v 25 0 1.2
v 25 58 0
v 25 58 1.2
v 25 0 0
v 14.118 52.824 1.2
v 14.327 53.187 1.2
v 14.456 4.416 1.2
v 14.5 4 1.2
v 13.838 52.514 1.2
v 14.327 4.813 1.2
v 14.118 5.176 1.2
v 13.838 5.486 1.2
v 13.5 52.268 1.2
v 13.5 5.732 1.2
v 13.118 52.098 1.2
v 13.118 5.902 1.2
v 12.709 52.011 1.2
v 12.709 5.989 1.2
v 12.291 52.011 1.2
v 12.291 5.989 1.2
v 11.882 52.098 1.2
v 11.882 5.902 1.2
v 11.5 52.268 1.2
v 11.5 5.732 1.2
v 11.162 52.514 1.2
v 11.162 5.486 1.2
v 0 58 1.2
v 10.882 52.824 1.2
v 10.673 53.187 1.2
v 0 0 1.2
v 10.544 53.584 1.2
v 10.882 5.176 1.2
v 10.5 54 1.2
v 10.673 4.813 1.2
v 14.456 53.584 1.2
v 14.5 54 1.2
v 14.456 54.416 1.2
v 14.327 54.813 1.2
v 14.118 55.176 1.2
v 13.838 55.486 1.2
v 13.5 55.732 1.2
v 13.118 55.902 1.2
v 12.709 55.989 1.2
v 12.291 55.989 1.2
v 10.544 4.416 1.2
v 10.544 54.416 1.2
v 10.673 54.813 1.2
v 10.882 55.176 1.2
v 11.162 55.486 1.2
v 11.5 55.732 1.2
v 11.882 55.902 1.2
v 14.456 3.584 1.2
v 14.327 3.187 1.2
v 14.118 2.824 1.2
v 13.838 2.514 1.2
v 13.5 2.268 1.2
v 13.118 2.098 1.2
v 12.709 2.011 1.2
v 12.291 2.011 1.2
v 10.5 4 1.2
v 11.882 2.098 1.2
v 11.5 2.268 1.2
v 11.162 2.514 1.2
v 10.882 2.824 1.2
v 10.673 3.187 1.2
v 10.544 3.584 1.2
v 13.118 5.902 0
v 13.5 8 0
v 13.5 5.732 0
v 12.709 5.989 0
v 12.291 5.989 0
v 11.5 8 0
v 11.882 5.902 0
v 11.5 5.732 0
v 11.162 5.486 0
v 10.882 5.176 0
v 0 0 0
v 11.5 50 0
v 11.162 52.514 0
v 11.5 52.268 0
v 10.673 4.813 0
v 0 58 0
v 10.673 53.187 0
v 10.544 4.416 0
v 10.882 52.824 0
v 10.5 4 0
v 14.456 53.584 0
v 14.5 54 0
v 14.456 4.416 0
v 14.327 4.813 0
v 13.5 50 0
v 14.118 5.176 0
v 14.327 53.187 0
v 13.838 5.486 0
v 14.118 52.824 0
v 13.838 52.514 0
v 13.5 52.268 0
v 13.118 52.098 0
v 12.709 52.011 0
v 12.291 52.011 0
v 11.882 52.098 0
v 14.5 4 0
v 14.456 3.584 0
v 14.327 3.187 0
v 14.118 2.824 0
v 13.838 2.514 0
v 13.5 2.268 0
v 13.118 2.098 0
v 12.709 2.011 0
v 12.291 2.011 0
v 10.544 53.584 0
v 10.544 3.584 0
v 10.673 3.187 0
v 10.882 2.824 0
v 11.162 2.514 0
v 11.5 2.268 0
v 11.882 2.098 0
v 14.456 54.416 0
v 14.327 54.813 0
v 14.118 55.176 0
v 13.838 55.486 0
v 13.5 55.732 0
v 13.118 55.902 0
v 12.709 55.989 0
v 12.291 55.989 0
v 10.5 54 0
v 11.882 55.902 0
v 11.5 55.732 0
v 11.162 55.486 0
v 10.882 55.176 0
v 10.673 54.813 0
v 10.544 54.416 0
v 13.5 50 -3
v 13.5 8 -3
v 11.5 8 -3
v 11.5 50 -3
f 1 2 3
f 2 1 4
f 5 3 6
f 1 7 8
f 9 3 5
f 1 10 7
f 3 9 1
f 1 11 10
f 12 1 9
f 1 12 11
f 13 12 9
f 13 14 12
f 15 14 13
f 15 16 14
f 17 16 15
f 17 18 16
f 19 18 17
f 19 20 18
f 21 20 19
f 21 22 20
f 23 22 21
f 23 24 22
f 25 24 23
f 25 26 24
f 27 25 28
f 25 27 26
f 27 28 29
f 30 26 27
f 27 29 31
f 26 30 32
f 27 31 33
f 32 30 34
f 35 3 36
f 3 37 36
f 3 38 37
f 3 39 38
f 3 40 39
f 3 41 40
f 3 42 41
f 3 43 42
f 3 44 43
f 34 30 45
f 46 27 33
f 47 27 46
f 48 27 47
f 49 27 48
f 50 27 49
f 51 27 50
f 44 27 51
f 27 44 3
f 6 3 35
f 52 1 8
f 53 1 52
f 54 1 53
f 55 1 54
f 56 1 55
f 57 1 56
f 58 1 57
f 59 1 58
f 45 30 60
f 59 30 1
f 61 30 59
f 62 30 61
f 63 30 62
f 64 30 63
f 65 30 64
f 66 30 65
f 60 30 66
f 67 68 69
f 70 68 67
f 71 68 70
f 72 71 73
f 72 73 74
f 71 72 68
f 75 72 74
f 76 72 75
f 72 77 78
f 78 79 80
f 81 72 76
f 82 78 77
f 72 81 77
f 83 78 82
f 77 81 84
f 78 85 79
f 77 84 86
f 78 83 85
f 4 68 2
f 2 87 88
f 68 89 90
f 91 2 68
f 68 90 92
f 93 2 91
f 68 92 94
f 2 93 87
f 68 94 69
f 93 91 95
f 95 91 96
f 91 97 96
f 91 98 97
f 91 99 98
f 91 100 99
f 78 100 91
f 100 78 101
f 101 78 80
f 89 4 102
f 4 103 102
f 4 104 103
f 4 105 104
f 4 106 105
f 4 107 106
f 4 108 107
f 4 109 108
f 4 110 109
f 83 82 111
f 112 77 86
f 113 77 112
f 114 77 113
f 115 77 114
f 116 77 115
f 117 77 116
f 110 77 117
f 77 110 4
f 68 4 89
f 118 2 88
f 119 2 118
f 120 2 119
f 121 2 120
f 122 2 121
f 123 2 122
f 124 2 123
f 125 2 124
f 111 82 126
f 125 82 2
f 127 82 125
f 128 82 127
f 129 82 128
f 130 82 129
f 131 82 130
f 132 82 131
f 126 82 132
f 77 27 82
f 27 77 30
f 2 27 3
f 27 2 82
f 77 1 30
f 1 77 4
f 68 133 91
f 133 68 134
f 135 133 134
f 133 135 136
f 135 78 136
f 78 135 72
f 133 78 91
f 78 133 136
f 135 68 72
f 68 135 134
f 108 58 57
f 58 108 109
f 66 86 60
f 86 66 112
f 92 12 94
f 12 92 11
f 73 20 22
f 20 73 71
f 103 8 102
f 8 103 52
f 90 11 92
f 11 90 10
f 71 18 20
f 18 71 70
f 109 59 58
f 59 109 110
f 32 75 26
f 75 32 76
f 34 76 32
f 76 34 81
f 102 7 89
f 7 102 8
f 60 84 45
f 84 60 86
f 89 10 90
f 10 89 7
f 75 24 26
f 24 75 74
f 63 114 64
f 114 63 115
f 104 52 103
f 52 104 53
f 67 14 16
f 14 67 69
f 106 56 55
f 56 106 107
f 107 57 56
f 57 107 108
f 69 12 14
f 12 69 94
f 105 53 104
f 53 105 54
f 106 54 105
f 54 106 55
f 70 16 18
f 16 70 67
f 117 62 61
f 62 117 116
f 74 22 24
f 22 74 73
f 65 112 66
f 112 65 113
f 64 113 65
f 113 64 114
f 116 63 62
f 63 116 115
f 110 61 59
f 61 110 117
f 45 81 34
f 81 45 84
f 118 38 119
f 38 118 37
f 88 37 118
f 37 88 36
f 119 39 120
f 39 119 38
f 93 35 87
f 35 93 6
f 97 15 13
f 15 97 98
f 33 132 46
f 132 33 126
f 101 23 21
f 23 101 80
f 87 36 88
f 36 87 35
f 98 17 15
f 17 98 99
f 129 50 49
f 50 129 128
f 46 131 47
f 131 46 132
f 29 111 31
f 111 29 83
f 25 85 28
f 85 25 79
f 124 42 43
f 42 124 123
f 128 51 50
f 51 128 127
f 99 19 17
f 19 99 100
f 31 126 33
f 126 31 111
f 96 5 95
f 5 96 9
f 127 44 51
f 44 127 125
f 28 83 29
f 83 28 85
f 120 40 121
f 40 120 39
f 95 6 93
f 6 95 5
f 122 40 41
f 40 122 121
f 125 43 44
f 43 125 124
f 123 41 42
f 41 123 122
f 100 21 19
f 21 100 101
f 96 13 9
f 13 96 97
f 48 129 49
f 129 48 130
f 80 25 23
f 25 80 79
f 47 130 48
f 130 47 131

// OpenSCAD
W = 25;
SLOT = 2;
SLOT_DEPTH = 3;
SCREW_SPACING = 50;
SCREW_DIA = 4;
L = SCREW_SPACING + SCREW_DIA * 2;

PACKING_THICKNESS = 1.2;

assert(L < 70);

SCREW_OFFSET = (L - SCREW_SPACING)/2;

$fn=30;

difference() {
  union() {
    cube([W, L, PACKING_THICKNESS]);
    translate([W/2 - SLOT/2, SCREW_OFFSET + SCREW_DIA, - SLOT_DEPTH]) cube([SLOT, L - SCREW_OFFSET * 2 - SCREW_DIA * 2, SLOT_DEPTH]);
  }
  translate([W/2, SCREW_OFFSET, -1]) {
    cylinder(d=SCREW_DIA, h = 5);
    translate([0, SCREW_SPACING, 0]) cylinder(d=SCREW_DIA, h = PACKING_THICKNESS + 2);
  }
}
